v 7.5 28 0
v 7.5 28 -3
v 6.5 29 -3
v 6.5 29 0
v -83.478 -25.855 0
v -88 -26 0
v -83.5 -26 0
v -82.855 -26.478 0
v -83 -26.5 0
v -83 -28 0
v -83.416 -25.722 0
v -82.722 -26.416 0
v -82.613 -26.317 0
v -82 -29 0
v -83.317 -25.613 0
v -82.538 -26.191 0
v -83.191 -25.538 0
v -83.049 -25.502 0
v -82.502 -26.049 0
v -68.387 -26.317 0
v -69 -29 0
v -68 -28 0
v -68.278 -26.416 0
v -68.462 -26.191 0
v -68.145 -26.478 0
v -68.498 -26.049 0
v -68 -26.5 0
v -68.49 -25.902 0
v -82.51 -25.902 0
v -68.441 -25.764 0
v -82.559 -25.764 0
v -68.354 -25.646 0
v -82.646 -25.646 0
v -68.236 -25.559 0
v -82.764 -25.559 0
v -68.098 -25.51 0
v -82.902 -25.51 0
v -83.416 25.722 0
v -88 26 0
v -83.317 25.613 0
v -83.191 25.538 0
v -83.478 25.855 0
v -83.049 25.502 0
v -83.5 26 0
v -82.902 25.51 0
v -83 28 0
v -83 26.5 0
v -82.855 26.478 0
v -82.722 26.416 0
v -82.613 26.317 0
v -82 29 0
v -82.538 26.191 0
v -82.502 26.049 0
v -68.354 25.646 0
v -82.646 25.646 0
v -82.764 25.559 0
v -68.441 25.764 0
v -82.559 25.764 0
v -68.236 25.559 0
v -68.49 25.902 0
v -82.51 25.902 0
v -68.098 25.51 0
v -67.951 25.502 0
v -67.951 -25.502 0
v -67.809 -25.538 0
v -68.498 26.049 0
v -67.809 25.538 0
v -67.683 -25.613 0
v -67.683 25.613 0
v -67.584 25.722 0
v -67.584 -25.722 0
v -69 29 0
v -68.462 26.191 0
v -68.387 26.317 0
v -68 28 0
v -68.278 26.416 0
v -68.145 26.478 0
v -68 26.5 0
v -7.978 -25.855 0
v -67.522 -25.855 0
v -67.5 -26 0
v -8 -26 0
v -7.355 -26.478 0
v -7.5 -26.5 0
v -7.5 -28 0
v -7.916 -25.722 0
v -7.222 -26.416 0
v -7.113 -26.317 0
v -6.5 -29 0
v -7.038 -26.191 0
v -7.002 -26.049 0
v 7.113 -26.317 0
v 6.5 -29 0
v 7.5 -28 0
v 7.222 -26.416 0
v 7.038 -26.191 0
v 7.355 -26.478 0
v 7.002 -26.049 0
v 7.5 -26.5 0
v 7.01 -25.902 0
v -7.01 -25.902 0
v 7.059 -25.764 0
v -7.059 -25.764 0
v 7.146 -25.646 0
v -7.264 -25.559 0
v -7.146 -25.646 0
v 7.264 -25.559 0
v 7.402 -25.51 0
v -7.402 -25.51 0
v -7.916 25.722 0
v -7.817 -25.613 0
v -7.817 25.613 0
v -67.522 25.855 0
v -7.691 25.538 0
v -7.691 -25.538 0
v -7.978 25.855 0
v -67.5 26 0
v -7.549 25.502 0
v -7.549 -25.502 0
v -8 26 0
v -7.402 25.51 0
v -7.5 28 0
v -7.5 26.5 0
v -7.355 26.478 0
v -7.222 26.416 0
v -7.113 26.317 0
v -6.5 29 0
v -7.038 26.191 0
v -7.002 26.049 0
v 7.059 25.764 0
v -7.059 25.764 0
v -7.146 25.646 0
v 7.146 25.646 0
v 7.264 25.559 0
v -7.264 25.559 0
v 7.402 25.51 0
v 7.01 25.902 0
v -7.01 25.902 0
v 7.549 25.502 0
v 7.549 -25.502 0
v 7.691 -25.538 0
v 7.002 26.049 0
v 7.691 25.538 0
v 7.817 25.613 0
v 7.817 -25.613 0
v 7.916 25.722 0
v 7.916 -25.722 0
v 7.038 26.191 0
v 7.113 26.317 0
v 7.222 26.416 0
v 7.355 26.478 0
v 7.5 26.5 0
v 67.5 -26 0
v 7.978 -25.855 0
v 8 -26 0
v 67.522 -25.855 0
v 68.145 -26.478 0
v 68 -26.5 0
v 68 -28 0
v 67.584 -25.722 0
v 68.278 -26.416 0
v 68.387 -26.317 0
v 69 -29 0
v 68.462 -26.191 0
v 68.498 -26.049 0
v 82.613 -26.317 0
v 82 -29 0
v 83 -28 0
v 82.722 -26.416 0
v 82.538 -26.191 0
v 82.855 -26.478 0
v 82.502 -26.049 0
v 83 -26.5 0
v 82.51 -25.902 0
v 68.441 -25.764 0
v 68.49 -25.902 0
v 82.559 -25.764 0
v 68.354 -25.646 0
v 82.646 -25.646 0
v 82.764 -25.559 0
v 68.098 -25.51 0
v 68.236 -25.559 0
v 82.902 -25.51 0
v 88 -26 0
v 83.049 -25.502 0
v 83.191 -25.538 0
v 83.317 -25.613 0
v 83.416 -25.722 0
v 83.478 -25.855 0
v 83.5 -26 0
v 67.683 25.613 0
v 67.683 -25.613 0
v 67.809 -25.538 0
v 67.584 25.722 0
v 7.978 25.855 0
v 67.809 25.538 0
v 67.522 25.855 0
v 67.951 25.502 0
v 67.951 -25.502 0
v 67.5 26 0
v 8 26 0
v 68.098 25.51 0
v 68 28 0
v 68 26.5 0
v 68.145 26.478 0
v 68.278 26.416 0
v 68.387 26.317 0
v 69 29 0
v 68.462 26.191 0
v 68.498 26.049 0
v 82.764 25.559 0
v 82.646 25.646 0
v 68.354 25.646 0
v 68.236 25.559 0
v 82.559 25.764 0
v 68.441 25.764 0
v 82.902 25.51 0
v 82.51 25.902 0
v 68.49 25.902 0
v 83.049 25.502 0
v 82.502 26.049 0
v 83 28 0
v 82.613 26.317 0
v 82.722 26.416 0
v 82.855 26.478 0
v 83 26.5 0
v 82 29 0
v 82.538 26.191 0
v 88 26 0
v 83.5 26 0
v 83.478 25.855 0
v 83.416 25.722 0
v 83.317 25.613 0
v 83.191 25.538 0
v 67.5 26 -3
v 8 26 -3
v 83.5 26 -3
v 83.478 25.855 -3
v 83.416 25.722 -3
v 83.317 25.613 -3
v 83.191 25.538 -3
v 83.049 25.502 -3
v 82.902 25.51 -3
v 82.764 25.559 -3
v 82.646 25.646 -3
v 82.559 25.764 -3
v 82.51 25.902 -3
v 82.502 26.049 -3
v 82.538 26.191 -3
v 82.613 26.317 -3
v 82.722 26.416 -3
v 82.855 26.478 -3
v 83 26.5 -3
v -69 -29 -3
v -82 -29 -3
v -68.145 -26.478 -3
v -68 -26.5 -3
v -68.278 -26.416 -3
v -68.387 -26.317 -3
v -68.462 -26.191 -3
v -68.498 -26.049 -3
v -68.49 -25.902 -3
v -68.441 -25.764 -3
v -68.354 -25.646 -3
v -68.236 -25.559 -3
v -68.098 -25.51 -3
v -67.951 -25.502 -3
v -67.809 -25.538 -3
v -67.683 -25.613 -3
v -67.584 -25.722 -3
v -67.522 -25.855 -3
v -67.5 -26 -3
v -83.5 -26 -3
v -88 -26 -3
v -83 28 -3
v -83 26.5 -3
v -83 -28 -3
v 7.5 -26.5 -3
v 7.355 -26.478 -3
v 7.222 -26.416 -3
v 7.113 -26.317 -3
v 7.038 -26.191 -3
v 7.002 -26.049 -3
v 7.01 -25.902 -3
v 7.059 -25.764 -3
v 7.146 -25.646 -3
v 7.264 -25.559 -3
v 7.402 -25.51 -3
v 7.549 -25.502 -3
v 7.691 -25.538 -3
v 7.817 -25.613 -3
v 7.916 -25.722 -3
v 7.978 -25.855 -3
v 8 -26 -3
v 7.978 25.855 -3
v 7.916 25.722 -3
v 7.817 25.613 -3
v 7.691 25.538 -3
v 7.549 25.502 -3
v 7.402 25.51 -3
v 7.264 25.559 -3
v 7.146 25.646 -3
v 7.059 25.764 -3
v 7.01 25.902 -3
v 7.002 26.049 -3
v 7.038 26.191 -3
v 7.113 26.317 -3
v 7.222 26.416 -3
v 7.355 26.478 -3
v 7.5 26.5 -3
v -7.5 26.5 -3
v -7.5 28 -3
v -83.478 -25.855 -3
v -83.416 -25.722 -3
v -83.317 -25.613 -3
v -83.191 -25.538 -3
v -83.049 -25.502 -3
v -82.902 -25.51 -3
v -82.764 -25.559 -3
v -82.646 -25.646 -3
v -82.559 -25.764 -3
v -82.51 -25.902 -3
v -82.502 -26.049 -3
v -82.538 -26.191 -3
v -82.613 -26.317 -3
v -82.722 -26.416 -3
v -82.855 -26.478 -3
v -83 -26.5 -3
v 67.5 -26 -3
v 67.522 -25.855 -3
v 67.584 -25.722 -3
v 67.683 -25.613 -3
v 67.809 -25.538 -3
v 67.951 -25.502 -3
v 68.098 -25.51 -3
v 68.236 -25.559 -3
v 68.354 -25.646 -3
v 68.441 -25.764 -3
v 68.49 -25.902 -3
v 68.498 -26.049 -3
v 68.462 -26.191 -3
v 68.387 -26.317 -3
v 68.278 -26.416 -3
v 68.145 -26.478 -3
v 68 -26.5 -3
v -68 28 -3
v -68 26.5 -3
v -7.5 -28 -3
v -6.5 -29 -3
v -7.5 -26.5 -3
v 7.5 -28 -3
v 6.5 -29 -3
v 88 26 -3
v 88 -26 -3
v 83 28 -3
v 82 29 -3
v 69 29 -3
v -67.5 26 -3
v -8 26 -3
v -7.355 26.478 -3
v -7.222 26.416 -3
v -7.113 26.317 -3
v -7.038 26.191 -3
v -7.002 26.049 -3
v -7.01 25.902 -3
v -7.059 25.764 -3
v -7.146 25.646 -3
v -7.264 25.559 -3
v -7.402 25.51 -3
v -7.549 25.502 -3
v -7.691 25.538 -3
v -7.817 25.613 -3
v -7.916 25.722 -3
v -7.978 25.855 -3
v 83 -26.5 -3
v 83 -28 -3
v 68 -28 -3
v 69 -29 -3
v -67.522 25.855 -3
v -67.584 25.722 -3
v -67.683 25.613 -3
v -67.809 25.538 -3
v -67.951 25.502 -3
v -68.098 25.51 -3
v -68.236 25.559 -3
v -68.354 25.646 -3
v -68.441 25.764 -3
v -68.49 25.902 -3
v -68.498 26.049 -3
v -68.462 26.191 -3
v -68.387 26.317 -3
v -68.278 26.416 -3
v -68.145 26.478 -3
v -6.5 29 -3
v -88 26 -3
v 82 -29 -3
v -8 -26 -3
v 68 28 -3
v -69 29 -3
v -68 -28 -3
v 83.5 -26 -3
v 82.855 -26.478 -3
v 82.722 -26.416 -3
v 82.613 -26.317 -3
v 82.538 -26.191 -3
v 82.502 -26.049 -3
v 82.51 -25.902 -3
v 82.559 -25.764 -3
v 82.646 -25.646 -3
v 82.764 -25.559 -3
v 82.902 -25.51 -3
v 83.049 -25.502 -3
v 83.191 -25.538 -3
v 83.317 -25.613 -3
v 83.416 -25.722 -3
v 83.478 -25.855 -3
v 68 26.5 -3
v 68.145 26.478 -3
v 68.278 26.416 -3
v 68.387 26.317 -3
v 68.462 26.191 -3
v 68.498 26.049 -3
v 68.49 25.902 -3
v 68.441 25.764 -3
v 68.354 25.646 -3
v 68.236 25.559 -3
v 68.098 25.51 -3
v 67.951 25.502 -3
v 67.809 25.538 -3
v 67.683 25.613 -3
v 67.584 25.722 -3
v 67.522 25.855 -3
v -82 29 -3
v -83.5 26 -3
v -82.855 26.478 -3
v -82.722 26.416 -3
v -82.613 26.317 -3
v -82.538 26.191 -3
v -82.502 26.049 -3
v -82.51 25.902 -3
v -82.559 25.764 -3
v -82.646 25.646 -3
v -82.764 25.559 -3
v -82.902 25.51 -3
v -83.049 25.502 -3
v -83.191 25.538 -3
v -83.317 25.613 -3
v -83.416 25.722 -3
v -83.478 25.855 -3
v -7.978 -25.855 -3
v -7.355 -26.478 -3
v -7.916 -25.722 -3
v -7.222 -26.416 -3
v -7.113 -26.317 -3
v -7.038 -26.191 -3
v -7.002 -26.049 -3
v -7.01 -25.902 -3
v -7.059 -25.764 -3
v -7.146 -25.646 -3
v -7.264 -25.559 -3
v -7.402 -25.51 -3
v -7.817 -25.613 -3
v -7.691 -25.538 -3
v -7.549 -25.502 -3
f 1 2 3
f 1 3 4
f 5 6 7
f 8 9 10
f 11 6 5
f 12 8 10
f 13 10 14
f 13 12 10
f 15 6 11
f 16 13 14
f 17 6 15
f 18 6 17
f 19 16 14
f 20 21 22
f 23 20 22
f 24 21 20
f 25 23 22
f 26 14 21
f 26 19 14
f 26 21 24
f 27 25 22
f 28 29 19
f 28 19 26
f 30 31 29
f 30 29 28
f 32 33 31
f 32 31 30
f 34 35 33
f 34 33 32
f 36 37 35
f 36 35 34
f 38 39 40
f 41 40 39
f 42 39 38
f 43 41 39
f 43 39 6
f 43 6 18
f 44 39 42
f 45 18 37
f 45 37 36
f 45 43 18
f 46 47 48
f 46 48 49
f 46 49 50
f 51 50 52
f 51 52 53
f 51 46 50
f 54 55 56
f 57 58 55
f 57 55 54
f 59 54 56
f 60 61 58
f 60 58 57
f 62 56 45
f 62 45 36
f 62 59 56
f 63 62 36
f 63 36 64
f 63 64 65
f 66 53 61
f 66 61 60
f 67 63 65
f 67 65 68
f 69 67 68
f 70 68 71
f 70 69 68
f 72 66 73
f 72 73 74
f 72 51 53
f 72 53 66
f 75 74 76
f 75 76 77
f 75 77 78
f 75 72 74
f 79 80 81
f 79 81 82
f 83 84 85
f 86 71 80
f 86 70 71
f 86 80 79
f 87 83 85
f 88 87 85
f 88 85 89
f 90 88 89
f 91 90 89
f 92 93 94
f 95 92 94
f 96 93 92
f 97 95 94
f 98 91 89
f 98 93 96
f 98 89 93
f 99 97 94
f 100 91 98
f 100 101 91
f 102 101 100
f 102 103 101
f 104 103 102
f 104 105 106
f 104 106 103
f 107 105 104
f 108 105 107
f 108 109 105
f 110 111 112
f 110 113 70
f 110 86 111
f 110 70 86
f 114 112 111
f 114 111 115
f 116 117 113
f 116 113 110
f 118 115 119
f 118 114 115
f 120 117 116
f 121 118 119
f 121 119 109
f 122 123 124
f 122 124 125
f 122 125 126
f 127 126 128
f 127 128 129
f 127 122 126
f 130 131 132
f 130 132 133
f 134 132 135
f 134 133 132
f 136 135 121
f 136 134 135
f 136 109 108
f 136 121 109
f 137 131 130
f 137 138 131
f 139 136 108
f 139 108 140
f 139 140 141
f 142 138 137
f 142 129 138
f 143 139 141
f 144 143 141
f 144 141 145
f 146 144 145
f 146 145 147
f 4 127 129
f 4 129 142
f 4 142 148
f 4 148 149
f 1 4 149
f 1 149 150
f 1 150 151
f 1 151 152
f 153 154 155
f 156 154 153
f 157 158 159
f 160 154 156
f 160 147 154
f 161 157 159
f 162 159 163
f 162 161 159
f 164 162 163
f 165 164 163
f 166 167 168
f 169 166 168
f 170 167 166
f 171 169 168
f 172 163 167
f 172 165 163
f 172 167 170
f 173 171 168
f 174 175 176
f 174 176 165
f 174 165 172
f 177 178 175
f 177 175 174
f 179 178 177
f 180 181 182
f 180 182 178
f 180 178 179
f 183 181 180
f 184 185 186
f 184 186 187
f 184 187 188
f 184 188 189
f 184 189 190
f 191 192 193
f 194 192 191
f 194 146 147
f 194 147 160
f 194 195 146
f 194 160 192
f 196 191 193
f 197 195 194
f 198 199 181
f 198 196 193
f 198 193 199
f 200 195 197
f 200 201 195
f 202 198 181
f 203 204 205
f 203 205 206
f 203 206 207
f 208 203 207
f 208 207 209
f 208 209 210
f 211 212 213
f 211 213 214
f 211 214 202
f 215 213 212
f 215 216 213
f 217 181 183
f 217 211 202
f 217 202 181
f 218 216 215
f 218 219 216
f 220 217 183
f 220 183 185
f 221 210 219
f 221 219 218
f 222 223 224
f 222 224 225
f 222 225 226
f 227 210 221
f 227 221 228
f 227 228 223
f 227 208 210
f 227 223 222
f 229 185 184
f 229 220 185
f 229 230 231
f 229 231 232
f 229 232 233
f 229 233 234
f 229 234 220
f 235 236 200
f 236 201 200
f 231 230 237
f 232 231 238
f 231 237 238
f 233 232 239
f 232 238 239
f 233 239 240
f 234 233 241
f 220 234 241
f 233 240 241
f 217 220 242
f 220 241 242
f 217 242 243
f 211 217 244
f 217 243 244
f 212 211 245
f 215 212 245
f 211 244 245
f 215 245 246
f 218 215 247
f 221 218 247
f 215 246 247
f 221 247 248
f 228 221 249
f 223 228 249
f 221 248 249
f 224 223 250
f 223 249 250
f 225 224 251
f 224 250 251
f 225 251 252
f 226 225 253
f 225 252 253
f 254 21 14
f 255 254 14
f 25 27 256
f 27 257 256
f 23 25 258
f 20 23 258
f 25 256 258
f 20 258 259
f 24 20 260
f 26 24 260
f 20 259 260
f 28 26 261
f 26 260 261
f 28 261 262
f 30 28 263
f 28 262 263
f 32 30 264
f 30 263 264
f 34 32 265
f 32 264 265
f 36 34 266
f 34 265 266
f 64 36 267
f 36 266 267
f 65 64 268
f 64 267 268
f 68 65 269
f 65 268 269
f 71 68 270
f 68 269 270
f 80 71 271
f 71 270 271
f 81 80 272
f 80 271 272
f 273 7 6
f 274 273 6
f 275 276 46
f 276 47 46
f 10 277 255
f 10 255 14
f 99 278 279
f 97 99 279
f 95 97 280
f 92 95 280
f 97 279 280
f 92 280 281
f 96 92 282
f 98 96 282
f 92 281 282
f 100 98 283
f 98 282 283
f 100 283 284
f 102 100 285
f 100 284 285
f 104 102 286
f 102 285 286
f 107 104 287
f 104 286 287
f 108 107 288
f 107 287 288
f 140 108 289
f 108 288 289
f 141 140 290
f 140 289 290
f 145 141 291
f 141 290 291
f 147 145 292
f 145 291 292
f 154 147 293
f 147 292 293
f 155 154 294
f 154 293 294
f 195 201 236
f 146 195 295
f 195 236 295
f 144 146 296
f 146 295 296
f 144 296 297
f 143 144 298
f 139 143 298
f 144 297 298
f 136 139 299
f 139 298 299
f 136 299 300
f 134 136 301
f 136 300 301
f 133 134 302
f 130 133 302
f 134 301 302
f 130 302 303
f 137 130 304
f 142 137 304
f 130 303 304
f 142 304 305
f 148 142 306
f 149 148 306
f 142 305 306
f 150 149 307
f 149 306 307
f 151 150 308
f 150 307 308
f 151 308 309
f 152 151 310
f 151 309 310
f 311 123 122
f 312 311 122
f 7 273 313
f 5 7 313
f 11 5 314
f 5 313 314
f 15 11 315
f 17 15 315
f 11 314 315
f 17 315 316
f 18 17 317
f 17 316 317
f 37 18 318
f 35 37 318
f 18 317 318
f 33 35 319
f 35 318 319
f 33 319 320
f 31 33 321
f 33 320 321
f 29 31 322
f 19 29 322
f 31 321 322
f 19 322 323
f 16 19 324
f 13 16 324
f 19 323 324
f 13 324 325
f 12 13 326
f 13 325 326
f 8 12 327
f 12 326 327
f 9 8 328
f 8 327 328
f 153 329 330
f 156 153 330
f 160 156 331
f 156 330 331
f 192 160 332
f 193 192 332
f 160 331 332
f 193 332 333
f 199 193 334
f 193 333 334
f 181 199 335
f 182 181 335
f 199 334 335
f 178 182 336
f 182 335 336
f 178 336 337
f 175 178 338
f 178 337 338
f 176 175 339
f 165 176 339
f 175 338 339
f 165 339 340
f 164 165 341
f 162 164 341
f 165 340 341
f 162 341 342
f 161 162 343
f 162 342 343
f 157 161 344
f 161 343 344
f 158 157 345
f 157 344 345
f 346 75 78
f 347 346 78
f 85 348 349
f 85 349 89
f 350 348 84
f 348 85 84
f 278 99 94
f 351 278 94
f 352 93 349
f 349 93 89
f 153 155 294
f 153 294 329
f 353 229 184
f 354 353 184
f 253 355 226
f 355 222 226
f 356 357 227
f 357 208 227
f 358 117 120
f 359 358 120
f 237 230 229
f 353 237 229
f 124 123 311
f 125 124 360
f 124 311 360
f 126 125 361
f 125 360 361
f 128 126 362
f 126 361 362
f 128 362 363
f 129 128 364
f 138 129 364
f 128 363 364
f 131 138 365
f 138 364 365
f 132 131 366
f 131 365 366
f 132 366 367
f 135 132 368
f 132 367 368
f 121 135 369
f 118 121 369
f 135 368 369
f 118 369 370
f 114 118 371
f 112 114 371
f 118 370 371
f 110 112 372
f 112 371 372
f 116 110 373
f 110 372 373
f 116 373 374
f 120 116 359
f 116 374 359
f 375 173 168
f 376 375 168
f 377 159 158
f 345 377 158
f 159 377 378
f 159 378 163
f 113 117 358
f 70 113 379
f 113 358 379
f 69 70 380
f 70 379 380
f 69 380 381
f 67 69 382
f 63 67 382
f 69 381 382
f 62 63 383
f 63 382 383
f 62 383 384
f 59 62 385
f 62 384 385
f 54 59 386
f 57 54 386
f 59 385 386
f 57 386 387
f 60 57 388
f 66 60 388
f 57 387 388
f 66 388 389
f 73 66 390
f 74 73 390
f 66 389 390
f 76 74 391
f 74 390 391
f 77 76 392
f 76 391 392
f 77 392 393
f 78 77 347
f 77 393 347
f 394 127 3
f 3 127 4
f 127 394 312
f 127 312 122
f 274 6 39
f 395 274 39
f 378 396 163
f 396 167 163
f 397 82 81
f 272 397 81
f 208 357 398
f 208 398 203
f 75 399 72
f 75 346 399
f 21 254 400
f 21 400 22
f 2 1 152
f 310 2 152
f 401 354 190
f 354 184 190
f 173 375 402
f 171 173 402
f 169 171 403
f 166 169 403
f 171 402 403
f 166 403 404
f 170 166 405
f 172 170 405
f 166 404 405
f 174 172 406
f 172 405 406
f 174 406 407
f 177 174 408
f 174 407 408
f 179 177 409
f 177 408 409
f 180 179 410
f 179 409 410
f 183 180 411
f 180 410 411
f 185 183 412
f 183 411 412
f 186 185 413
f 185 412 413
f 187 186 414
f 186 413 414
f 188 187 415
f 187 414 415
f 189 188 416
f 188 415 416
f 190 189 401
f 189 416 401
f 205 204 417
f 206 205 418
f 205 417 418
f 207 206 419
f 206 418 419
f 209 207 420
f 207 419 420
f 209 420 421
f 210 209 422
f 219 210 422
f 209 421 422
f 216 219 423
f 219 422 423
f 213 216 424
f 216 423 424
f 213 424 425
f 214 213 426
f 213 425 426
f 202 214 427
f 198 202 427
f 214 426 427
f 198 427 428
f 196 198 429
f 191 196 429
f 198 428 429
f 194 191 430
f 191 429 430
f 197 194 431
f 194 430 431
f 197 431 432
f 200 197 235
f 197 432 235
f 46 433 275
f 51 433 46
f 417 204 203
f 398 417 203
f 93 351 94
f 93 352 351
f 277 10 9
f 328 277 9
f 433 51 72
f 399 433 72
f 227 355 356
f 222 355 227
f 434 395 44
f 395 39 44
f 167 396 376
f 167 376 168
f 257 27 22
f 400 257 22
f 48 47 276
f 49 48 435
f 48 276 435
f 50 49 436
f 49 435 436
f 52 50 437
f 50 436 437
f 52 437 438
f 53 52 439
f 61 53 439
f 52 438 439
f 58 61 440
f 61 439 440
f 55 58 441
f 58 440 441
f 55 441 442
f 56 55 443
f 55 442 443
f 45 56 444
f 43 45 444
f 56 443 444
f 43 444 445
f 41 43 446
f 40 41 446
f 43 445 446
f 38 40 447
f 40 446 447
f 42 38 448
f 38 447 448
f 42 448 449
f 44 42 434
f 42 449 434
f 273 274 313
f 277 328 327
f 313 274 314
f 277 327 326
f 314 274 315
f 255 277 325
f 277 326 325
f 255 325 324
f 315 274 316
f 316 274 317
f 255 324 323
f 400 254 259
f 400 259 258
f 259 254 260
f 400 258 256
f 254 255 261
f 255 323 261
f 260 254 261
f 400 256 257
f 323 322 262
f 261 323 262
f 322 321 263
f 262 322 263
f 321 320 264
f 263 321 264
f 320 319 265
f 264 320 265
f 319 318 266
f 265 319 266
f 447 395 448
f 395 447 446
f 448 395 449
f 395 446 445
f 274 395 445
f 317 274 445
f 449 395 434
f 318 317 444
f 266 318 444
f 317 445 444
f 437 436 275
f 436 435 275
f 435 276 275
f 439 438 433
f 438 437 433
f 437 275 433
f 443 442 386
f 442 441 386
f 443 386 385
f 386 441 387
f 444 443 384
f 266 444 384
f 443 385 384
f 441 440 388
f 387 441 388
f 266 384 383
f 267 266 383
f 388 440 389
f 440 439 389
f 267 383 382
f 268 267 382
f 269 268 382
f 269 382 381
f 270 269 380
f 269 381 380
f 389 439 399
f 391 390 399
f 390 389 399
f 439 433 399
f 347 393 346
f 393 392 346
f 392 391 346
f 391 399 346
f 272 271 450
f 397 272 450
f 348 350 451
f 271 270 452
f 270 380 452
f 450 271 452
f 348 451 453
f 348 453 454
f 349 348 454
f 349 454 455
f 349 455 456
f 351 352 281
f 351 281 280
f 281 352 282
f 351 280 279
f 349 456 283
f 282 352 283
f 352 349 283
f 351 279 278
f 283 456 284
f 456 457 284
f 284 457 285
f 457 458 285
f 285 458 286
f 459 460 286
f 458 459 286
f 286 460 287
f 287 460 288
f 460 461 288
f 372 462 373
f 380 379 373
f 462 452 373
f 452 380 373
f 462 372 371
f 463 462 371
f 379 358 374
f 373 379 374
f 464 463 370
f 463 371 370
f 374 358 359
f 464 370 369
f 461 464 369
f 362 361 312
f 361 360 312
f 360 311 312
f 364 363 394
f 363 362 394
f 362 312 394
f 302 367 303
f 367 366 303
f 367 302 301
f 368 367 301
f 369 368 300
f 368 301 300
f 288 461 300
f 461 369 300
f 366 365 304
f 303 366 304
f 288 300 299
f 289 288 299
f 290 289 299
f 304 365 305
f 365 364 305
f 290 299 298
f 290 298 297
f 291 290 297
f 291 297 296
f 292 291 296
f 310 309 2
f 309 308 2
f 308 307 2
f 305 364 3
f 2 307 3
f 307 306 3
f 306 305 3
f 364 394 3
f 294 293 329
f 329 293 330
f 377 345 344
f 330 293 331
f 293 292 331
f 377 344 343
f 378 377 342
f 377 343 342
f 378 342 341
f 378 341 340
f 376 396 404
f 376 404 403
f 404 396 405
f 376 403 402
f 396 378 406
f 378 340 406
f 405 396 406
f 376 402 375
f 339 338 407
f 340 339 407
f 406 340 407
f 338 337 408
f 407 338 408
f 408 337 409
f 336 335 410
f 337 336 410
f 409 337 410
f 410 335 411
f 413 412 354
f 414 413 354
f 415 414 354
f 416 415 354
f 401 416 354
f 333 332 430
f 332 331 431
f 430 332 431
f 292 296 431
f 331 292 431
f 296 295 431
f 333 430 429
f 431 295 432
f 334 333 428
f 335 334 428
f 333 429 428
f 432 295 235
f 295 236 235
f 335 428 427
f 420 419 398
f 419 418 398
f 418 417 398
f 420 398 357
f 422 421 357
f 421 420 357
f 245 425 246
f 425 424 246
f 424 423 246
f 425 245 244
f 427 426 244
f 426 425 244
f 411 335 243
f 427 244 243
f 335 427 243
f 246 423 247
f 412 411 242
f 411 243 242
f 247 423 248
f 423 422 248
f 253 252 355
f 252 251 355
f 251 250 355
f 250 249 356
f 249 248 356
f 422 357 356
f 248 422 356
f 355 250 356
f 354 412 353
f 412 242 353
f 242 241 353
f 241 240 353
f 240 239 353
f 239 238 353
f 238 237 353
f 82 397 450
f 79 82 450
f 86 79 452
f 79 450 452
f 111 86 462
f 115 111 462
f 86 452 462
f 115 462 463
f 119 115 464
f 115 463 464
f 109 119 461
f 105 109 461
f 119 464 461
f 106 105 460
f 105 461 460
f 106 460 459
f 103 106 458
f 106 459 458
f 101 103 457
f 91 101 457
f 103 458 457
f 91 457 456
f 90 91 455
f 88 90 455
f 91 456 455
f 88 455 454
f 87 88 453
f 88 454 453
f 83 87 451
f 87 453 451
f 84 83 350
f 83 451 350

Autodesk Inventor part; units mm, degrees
ref_plane "Plan YZ" through (0, 0, 0) normal (1, 0, 0) x (0, 1, 0)
ref_plane "Plan XZ" through (0, 0, 0) normal (0, 1, 0) x (-1, 0, 0)
ref_plane "Plan XY" through (0, 0, 0) normal (0, 0, 1) x (1, 0, 0)
sketch "Esquisse7" plane through (0, 0, 0) normal (0, 0, 1) x (1, 0, 0)
  line L0 (-88, -26) -> (-88, 26)
  line L1 (-88, 26) -> (-83, 26)
  line L2 (-83, 26) -> (-83, 29)
  line L3 (-83, 29) -> (-68, 29)
  line L4 (-68, 29) -> (-68, 26)
  line L5 (-68, 26) -> (-7.5, 26)
  line L6 (-7.5, 26) -> (-7.5, 29)
  line L7 (-7.5, 29) -> (7.5, 29)
  line L8 (7.5, 29) -> (7.5, 26)
  line L9 (7.5, 26) -> (68, 26)
  line L10 (68, 26) -> (68, 29)
  line L11 (68, 29) -> (83, 29)
  line L12 (83, 29) -> (83, 26)
  line L13 (83, 26) -> (88, 26)
  line L14 (88, 26) -> (88, -26)
  line L15 (88, -26) -> (83, -26)
  line L16 (83, -26) -> (83, -29)
  line L17 (83, -29) -> (68, -29)
  line L18 (68, -29) -> (68, -26)
  line L19 (7.5, -26) -> (7.5, -29)
  line L20 (7.5, -26) -> (68, -26)
  line L21 (7.5, -29) -> (-7.5, -29)
  line L22 (-7.5, -29) -> (-7.5, -26)
  line L23 (-7.5, -26) -> (-68, -26)
  line L24 (-68, -26) -> (-68, -29)
  line L25 (-68, -29) -> (-83, -29)
  line L26 (-83, -29) -> (-83, -26)
  line L27 (-83, -26) -> (-88, -26)
  line L28 (0, -40.6) -> (0, 40.6) construction
  line L29 (-123.2, 0) -> (123.2, 0) construction
  dimension "d33" = 52
  dimension "d34" = 15
  dimension "d35" = 3
  dimension "d36" = 5
  dimension "d65" = 176
extrude "Extrusion2" add sketch "Esquisse7" against normal blind 3
sketch "Esquisse8" plane through (0, 0, 0) normal (0, 0, 1) x (1, 0, 0)
  point P0 (0, 0)
  point P1 (7.5, 26)
  point P2 (-7.5, 26)
  point P3 (-83, 26)
  point P4 (-68, 26)
  point P5 (-83, -26)
  point P6 (-68, -26)
  point P7 (-7.5, -26)
  point P8 (7.5, -26)
  point P9 (68, -26)
  point P10 (83, -26)
  point P11 (68, 26)
  point P12 (83, 26)
  point P13 (83, 26)
  point P14 (68, -26)
  point P15 (83, 26)
hole "Perçage2" at (7.5, 26, 0) at (-7.5, 26, 0) at (-83, 26, 0) at (-68, 26, 0) at (-83, -26, 0) at (-68, -26, 0) at (-7.5, -26, 0) at (7.5, -26, 0) at (68, -26, 0) at (83, -26, 0) at (68, 26, 0) at (83, 26, 0) direction (0, 0, -1) diameter 1 end through all
chamfer "Chanfrein3" distance 1 angle 45 12 edges at (-83, -29, -1.5) (-68, -29, -1.5) (-83, 29, -1.5) (-68, 29, -1.5) (-7.5, 29, -1.5) (7.5, 29, -1.5) (68, 29, -1.5) (83, 29, -1.5) (68, -29, -1.5) (83, -29, -1.5) (-7.5, -29, -1.5) (7.5, -29, -1.5)
properties part number "P1704_102" material "Plastique PMMA"
